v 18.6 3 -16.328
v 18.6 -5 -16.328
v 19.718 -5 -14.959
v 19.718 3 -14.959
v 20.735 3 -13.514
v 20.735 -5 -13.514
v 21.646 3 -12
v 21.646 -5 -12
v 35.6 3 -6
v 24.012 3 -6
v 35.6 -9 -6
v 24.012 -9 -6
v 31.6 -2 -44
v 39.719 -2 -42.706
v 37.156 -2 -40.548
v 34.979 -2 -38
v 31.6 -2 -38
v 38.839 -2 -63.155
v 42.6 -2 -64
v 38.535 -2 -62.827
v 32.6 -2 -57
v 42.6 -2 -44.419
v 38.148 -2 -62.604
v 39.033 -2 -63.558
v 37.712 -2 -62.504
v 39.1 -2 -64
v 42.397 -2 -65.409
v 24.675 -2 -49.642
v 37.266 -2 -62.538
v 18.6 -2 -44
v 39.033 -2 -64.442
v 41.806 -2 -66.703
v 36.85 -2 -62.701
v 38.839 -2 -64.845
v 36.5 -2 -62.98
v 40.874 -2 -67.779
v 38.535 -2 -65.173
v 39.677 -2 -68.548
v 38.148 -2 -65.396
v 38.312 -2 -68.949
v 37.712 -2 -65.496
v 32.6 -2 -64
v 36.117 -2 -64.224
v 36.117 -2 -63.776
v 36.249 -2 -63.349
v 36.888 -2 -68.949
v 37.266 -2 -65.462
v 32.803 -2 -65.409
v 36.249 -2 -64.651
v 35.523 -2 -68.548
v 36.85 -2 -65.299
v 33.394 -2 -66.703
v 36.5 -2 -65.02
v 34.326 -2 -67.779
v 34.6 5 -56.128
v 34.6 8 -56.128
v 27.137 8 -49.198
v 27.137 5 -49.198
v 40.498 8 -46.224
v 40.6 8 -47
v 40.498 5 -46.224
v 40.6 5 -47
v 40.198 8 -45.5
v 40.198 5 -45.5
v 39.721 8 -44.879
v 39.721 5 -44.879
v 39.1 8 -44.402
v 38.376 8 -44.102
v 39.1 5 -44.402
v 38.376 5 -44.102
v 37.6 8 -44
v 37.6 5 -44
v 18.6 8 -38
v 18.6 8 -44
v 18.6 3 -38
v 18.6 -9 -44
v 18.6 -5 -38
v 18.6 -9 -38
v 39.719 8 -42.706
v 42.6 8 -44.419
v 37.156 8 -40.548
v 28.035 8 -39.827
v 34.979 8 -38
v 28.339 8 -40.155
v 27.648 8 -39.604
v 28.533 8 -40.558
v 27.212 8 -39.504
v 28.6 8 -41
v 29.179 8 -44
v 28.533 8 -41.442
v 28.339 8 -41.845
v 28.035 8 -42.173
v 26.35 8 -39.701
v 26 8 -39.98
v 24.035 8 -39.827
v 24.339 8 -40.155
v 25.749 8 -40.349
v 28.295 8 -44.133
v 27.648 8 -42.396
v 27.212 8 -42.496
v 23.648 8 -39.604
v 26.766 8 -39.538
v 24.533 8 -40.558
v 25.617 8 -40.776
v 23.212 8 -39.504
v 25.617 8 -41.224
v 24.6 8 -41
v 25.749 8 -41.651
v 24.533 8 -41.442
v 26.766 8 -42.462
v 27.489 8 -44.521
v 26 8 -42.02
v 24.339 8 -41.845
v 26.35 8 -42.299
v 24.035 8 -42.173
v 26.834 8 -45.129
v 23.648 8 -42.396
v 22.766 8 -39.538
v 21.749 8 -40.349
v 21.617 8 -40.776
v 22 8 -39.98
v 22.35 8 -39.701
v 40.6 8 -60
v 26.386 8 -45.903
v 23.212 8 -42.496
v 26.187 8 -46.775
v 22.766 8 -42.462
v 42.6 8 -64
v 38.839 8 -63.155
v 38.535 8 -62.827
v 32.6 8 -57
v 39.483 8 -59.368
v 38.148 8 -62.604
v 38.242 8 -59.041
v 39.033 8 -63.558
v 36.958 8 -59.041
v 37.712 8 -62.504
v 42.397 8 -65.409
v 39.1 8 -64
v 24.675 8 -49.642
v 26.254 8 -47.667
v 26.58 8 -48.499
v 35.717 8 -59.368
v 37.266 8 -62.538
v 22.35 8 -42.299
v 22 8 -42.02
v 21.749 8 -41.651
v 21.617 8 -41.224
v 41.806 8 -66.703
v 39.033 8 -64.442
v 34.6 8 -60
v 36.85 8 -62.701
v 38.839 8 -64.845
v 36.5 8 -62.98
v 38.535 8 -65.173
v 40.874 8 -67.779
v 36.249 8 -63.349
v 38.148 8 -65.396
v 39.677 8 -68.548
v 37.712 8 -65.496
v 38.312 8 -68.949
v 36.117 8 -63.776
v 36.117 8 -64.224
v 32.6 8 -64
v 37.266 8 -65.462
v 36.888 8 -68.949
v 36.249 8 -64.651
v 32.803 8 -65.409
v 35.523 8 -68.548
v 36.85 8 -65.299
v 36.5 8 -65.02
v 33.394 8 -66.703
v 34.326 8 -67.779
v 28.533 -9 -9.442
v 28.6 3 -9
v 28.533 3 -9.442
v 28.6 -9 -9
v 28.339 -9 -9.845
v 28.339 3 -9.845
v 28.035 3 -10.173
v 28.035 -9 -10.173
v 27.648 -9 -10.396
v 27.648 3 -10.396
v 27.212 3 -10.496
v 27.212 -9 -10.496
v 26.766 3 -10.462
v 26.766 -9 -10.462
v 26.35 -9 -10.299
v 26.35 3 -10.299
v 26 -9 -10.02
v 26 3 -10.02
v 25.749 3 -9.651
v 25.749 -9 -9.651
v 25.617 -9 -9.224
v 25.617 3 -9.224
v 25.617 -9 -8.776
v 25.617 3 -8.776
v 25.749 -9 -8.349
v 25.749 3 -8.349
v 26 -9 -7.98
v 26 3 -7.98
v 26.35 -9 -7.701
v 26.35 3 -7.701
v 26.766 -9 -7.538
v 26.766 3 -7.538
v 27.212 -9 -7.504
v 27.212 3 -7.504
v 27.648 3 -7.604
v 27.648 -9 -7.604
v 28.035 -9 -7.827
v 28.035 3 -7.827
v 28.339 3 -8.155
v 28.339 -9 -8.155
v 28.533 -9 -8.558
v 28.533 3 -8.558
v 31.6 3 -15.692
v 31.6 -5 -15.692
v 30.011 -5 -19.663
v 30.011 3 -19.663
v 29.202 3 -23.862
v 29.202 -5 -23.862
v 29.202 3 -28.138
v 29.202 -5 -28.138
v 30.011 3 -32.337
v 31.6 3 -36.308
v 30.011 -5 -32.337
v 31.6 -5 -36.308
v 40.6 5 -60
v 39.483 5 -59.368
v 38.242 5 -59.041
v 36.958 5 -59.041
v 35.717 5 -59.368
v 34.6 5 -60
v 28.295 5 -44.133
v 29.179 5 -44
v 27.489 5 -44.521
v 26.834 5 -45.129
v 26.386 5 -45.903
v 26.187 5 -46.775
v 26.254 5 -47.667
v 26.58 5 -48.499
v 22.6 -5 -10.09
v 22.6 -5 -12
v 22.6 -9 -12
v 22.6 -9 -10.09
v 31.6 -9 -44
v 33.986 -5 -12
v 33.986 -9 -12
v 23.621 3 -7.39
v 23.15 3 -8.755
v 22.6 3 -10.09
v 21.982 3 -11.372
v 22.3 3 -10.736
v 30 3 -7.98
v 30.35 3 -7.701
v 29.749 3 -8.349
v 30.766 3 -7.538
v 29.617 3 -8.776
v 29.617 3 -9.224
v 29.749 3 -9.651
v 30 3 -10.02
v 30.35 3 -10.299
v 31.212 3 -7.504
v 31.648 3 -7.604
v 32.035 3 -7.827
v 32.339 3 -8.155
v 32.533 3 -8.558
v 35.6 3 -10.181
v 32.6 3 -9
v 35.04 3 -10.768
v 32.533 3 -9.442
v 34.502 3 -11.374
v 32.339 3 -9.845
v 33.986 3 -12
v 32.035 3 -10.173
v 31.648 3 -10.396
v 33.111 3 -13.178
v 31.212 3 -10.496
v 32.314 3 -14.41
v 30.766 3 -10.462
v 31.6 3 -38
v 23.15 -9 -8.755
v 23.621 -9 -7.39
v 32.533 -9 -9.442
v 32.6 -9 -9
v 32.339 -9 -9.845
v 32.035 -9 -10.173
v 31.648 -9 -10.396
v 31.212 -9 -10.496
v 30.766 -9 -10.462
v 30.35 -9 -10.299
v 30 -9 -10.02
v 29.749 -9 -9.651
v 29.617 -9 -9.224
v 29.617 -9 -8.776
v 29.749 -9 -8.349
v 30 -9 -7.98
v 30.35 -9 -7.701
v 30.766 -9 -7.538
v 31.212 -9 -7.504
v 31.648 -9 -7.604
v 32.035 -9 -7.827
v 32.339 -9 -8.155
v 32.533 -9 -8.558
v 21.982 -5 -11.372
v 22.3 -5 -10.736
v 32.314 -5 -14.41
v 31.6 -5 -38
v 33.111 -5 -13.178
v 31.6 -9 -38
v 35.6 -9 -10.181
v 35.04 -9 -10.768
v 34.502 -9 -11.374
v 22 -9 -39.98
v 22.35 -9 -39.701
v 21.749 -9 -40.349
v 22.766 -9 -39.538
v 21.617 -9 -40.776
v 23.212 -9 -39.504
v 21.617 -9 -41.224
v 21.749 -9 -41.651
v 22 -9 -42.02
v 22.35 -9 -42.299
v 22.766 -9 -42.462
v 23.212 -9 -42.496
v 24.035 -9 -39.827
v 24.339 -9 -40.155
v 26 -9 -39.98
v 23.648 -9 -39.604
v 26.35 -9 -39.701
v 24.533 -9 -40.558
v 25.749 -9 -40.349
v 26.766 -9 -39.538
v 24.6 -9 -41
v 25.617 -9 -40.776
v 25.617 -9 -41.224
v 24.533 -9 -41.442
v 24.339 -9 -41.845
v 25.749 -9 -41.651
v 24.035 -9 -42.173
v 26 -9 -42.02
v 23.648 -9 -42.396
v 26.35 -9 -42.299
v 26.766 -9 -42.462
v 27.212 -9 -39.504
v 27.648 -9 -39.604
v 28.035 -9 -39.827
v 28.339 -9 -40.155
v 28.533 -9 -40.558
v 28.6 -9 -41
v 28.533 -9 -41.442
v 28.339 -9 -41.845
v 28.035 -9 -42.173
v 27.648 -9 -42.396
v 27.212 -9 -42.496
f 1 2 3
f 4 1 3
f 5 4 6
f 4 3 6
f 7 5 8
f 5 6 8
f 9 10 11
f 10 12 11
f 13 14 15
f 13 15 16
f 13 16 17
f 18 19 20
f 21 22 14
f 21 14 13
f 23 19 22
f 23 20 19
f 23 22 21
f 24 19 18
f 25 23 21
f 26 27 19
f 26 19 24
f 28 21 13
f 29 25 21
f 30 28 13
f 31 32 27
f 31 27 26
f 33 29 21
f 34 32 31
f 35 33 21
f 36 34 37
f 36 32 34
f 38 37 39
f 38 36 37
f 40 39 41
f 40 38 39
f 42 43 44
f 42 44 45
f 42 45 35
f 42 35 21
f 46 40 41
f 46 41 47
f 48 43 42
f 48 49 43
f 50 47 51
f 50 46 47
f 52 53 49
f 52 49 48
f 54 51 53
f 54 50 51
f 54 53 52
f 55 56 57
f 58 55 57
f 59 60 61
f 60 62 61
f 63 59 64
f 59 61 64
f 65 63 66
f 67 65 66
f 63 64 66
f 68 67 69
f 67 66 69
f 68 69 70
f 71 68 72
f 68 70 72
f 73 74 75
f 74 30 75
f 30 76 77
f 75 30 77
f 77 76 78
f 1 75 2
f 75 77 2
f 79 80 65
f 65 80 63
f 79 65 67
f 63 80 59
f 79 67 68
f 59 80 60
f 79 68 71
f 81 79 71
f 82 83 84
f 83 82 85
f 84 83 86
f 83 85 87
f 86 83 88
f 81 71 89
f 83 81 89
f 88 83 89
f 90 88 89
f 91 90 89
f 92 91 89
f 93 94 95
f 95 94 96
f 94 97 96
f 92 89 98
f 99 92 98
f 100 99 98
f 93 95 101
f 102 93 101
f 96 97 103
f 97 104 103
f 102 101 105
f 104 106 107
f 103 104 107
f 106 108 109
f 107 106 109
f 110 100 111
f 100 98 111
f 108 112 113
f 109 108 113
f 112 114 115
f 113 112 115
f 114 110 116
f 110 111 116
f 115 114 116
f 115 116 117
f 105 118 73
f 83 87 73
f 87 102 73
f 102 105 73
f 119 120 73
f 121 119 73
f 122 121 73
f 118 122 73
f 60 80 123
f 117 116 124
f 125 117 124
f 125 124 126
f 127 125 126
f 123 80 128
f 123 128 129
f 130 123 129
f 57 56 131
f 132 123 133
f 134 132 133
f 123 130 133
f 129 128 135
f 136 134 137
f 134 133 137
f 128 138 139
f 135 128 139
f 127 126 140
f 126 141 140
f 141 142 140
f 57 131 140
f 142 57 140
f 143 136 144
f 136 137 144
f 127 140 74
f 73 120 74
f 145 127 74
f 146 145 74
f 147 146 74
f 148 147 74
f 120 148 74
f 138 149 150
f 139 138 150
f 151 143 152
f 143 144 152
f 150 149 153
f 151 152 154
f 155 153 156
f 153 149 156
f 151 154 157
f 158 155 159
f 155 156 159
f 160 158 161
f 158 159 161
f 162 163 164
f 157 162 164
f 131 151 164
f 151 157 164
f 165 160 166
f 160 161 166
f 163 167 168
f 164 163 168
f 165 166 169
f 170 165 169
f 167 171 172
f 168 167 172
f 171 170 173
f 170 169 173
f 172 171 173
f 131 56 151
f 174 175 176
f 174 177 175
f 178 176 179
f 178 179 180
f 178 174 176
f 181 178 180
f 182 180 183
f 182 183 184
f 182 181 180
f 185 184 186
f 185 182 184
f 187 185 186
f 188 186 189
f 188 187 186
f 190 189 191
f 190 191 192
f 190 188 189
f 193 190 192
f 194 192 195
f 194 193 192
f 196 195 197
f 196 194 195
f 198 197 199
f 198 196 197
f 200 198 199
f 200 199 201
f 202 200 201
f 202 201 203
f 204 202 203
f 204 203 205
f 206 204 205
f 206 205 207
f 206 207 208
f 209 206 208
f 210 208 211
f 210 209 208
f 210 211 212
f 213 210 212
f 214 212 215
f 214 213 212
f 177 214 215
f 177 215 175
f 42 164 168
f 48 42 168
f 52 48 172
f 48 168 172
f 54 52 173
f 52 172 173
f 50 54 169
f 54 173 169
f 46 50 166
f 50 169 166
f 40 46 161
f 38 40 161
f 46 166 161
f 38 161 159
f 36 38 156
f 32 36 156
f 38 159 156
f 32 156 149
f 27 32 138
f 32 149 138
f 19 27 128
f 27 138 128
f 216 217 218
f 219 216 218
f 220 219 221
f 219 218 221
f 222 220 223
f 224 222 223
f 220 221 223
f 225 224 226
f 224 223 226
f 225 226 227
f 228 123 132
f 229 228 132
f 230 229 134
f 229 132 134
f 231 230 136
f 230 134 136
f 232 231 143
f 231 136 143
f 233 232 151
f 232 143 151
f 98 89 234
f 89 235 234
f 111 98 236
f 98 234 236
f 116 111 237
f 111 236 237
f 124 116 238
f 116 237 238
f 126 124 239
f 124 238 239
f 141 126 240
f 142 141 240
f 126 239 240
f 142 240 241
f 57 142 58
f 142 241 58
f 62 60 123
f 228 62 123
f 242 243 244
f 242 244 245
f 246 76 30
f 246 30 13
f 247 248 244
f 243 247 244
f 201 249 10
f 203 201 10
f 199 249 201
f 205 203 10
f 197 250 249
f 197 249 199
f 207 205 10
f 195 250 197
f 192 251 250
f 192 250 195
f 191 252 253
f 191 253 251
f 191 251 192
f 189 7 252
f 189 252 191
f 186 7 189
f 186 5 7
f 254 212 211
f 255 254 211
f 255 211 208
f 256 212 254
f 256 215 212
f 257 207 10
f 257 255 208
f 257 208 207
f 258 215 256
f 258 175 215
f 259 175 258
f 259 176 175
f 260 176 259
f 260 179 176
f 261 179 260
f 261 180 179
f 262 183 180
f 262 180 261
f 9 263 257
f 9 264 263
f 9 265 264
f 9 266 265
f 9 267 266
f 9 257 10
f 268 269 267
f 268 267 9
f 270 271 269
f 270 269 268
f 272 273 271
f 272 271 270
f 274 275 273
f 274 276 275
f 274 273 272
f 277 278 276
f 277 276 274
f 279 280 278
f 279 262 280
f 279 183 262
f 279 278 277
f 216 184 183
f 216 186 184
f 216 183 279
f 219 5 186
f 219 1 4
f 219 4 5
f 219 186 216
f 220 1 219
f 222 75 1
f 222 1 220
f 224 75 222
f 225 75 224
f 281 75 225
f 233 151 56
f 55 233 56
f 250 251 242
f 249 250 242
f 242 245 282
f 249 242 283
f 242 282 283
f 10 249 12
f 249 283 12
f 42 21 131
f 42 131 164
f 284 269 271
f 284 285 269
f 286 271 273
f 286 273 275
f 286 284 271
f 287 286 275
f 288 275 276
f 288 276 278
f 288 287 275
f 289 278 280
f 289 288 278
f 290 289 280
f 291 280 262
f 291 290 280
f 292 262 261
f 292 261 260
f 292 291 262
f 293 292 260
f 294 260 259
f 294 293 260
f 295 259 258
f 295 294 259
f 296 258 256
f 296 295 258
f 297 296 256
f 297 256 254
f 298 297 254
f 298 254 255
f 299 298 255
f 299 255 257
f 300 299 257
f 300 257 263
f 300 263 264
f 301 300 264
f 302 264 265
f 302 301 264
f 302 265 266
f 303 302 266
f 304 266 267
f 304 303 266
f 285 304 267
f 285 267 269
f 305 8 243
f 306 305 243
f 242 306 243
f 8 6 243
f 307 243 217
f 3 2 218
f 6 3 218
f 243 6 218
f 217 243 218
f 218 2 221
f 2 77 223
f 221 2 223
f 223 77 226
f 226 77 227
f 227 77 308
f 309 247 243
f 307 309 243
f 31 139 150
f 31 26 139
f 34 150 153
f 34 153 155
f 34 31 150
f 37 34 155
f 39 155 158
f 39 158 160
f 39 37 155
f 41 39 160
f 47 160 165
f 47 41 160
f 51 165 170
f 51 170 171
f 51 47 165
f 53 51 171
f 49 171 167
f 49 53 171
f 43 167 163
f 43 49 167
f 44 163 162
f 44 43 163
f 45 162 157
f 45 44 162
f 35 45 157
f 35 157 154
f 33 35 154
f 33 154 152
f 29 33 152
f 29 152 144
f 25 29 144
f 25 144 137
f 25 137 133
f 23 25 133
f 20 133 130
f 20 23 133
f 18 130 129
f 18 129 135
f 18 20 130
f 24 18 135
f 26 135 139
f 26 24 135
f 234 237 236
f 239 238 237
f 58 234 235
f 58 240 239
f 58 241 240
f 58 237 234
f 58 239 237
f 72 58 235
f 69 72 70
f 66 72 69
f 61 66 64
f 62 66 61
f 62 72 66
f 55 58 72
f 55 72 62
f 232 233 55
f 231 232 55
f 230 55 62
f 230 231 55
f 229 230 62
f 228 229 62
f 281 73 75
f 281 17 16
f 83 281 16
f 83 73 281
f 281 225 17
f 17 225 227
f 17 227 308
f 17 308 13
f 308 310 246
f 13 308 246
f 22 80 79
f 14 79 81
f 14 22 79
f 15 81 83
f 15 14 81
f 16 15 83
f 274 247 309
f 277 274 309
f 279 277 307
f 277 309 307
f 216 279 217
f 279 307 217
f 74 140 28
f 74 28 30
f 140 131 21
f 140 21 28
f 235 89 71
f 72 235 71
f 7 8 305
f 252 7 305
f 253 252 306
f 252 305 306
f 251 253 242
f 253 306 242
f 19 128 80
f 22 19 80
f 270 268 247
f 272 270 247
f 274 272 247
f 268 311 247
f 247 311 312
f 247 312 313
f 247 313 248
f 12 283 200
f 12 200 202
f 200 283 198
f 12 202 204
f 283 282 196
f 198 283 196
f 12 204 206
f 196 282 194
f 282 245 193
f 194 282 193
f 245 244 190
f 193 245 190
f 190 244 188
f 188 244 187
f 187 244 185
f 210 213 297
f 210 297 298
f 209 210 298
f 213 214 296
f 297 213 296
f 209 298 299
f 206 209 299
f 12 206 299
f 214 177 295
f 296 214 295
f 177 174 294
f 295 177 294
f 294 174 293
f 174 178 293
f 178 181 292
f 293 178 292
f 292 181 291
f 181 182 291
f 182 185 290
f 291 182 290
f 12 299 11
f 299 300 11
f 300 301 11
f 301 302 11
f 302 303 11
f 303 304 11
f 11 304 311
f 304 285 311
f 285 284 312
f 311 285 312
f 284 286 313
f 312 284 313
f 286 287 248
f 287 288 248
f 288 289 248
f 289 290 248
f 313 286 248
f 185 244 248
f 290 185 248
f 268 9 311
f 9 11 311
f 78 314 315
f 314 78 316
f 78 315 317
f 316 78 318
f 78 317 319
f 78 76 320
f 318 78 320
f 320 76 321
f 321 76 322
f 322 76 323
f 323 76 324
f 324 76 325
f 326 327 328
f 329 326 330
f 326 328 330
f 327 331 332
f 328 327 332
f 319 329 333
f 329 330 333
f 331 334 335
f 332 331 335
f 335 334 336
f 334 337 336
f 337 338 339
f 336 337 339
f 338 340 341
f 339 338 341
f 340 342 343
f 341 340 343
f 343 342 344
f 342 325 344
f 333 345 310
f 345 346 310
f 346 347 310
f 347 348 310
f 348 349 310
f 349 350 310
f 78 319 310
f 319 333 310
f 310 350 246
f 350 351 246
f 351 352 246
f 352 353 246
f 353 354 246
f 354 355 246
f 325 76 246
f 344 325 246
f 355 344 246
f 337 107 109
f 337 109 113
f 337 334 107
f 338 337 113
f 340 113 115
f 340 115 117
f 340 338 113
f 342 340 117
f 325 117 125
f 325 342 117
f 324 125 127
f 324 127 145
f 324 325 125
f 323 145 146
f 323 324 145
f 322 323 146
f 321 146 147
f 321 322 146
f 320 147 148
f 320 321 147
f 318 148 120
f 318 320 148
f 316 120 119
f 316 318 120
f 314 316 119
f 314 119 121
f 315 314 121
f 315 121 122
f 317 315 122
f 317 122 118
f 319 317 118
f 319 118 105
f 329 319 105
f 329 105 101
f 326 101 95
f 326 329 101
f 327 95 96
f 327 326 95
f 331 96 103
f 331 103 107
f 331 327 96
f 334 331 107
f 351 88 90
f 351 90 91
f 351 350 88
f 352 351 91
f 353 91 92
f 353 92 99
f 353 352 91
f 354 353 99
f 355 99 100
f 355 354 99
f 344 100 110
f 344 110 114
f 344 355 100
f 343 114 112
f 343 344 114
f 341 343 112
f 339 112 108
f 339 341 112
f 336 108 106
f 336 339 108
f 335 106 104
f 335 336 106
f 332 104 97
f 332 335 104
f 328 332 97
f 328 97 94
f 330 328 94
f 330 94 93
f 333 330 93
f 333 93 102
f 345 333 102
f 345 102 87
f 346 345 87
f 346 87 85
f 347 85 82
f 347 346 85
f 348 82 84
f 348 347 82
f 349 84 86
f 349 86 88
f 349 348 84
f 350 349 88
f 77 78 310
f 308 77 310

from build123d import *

# Parameters (mm, degrees)
SKETCH1_W               = 13
SKETCH1_H               = 6
SKETCH1_R               = 1.5
BOSS_EXTRUDE1_DEPTH     = 4
BOSS_EXTRUDE1_2_DEPTH   = 4
BOSS_EXTRUDE2_START     = 4
SKETCH1_4_R             = 1.5
SKETCH1_4_W             = 13
SKETCH1_4_H             = 6
BOSS_EXTRUDE2_DEPTH     = 8
SKETCH2_R               = 1.5
BOSS_EXTRUDE3_DEPTH     = 5
SKETCH2_3_R             = 1.5
BOSS_EXTRUDE4_DEPTH     = 5
CUT_EXTRUDE1_DEPTH      = 3
FILLET3_R               = 3
SKETCH4_R               = 20.5
CUT_EXTRUDE2_DEPTH      = 6
CUT_EXTRUDE2_DEPTH_BACK = 13


with BuildPart() as part:
    # Sketch1 → Boss-Extrude1 (new body)
    with BuildSketch(Plane(origin=(0, -9, 0), x_dir=(1, 0, 0), z_dir=(0, 1, 0))):
        with Locations((25.1, 41)):
            Rectangle(SKETCH1_W, SKETCH1_H)
        with Locations((27.1, 41)):
            Circle(SKETCH1_R, mode=Mode.SUBTRACT)
        with Locations((23.1, 41)):
            Circle(SKETCH1_R, mode=Mode.SUBTRACT)
    extrude(amount=BOSS_EXTRUDE1_DEPTH)



with BuildPart() as body_2:
    # Sketch1 → Boss-Extrude1 2 (new body)
    with BuildSketch(Plane(origin=(0, -9, 0), x_dir=(1, 0, 0), z_dir=(0, 1, 0))):
        with BuildLine():
            ThreePointArc((22.6, 10.089722494), (23.395394249, 8.075767946), (24.01171589, 6))
            Line((24.01171589, 6), (35.6, 6))
            Line((35.6, 6), (35.6, 10.18070798))
            ThreePointArc((35.6, 10.18070798), (34.768444056, 11.068532406), (33.986085046, 12))
            Line((33.986085046, 12), (31.6, 12))
            Line((31.6, 12), (22.6, 12))
            Line((22.6, 12), (22.6, 10.089722494))
        make_face()
        with Locations((27.1, 9)):
            Circle(SKETCH1_R, mode=Mode.SUBTRACT)
        with Locations((31.1, 9)):
            Circle(SKETCH1_R, mode=Mode.SUBTRACT)
    extrude(amount=BOSS_EXTRUDE1_2_DEPTH)


with BuildPart() as part_1:
    add(part.part)

    add(body_2.part)  # Boss-Extrude2 merges body 2
    # Sketch1<4> → Boss-Extrude2 (add)
    with BuildSketch(Plane(origin=(0, -9, 0), x_dir=(1, 0, 0), z_dir=(0, 1, 0)).offset(BOSS_EXTRUDE2_START)):
        with BuildLine():
            ThreePointArc((22.6, 10.089722494), (23.395394249, 8.075767946), (24.01171589, 6))
            Line((24.01171589, 6), (35.6, 6))
            Line((35.6, 6), (35.6, 10.18070798))
            ThreePointArc((35.6, 10.18070798), (34.768444056, 11.068532406), (33.986085046, 12))
            Line((33.986085046, 12), (31.6, 12))
            Line((31.6, 12), (22.6, 12))
            Line((22.6, 12), (22.6, 10.089722494))
        make_face()
        with Locations((27.1, 9)):
            Circle(SKETCH1_4_R, mode=Mode.SUBTRACT)
        with Locations((31.1, 9)):
            Circle(SKETCH1_4_R, mode=Mode.SUBTRACT)
        with BuildLine():
            Line((21.646304534, 12), (22.6, 12))
            Line((22.6, 12), (31.6, 12))
            Line((31.6, 12), (31.6, 15.692235936))
            ThreePointArc((31.6, 15.692235936), (29.1, 26), (31.6, 36.307764064))
            Line((31.6, 36.307764064), (31.6, 38))
            Line((31.6, 38), (18.6, 38))
            Line((18.6, 38), (18.6, 16.327966805))
            ThreePointArc((18.6, 16.327966805), (20.239171953, 14.245645604), (21.646304534, 12))
        make_face()
        with BuildLine():
            Line((31.6, 15.692235936), (31.6, 12))
            Line((31.6, 12), (33.986085046, 12))
            ThreePointArc((33.986085046, 12), (32.702650951, 13.787702963), (31.6, 15.692235936))
        make_face()
        with BuildLine():
            ThreePointArc((21.646304534, 12), (22.143761114, 11.055150099), (22.6, 10.089722494))
            Line((22.6, 10.089722494), (22.6, 12))
            Line((22.6, 12), (21.646304534, 12))
        make_face()
        with Locations((25.1, 41)):
            Rectangle(SKETCH1_4_W, SKETCH1_4_H)
        with Locations((27.1, 41)):
            Circle(SKETCH1_4_R, mode=Mode.SUBTRACT)
        with Locations((23.1, 41)):
            Circle(SKETCH1_4_R, mode=Mode.SUBTRACT)
    extrude(amount=BOSS_EXTRUDE2_DEPTH)

    # Sketch2 → Boss-Extrude3 (add)
    with BuildSketch(Plane(origin=(0, 3, 0), x_dir=(1, 0, 0), z_dir=(0, 1, 0))):
        with BuildLine():
            ThreePointArc((32.6, 64), (37.6, 69), (42.6, 64))
            Line((42.6, 64), (42.6, 43))
            ThreePointArc((42.6, 43), (37.6, 38), (32.6, 43))
            Line((32.6, 43), (32.6, 64))
        make_face()
        with Locations((37.6, 64)):
            Circle(SKETCH2_R, mode=Mode.SUBTRACT)
        Polygon((24.675471698, 49.641509434), (30.1, 44), (31.6, 44), (32.6, 44), (32.6, 57), align=None)
        Polygon((24.675471698, 49.641509434), (18.6, 44), (30.1, 44), align=None)
        Polygon((30.1, 44), (18.6, 44), (18.6, 38), (31.6, 38), (31.6, 44), align=None)
        with Locations((23.1, 41)):
            Circle(SKETCH2_R, mode=Mode.SUBTRACT)
        with Locations((27.1, 41)):
            Circle(SKETCH2_R, mode=Mode.SUBTRACT)
        with BuildLine():
            Line((32.6, 43), (32.6, 38))
            Line((32.6, 38), (37.6, 38))
            ThreePointArc((37.6, 38), (34.064466094, 39.464466094), (32.6, 43))
        make_face()
        Polygon((32.6, 44), (31.6, 44), (31.6, 38), (32.6, 38), (32.6, 43), align=None)
    extrude(amount=BOSS_EXTRUDE3_DEPTH)

    # Sketch2<3> → Boss-Extrude4 (add)
    with BuildSketch(Plane(origin=(0, 3, 0), x_dir=(1, 0, 0), z_dir=(0, 1, 0))):
        with BuildLine():
            ThreePointArc((32.6, 64), (37.6, 69), (42.6, 64))
            Line((42.6, 64), (42.6, 43))
            ThreePointArc((42.6, 43), (37.6, 38), (32.6, 43))
            Line((32.6, 43), (32.6, 64))
        make_face()
        with Locations((37.6, 64)):
            Circle(SKETCH2_3_R, mode=Mode.SUBTRACT)
        Polygon((24.675471698, 49.641509434), (30.1, 44), (31.6, 44), (32.6, 44), (32.6, 57), align=None)
        Polygon((24.675471698, 49.641509434), (18.6, 44), (30.1, 44), align=None)
        Polygon((32.6, 44), (31.6, 44), (31.6, 38), (32.6, 38), (32.6, 43), align=None)
        with BuildLine():
            Line((32.6, 43), (32.6, 38))
            Line((32.6, 38), (37.6, 38))
            ThreePointArc((37.6, 38), (34.064466094, 39.464466094), (32.6, 43))
        make_face()
    extrude(amount=-BOSS_EXTRUDE4_DEPTH)

    # Sketch3 → Cut-Extrude1 (cut)
    with BuildSketch(Plane(origin=(0, 8, 0), x_dir=(1, 0, 0), z_dir=(0, 1, 0))):
        with BuildLine():
            Line((34.6, 60), (34.6, 56.127860975))
            Line((34.6, 56.127860975), (21.539226642, 44))
            Line((21.539226642, 44), (40.6, 44))
            Line((40.6, 44), (40.6, 60))
            ThreePointArc((40.6, 60), (37.6, 59), (34.6, 60))
        make_face()
    extrude(amount=-CUT_EXTRUDE1_DEPTH, mode=Mode.SUBTRACT)

    # Fillet3
    fillet3_edges = [part_1.edges().sort_by_distance(p)[0] for p in [
        (40.6, 6.5, -44),
        (21.539226642, 6.5, -44),
    ]]
    fillet(fillet3_edges, radius=FILLET3_R)

    # Sketch4 → Cut-Extrude2 (cut, two sides)
    with BuildSketch(Plane(origin=(0, 3, 0), x_dir=(1, 0, 0), z_dir=(0, 1, 0))) as cut_extrude2_sk:
        with Locations((51.6, 26)):
            Circle(SKETCH4_R)
    extrude(amount=CUT_EXTRUDE2_DEPTH, mode=Mode.SUBTRACT)
    extrude(cut_extrude2_sk.sketch, amount=-CUT_EXTRUDE2_DEPTH_BACK, mode=Mode.SUBTRACT)


solid = part_1.part
